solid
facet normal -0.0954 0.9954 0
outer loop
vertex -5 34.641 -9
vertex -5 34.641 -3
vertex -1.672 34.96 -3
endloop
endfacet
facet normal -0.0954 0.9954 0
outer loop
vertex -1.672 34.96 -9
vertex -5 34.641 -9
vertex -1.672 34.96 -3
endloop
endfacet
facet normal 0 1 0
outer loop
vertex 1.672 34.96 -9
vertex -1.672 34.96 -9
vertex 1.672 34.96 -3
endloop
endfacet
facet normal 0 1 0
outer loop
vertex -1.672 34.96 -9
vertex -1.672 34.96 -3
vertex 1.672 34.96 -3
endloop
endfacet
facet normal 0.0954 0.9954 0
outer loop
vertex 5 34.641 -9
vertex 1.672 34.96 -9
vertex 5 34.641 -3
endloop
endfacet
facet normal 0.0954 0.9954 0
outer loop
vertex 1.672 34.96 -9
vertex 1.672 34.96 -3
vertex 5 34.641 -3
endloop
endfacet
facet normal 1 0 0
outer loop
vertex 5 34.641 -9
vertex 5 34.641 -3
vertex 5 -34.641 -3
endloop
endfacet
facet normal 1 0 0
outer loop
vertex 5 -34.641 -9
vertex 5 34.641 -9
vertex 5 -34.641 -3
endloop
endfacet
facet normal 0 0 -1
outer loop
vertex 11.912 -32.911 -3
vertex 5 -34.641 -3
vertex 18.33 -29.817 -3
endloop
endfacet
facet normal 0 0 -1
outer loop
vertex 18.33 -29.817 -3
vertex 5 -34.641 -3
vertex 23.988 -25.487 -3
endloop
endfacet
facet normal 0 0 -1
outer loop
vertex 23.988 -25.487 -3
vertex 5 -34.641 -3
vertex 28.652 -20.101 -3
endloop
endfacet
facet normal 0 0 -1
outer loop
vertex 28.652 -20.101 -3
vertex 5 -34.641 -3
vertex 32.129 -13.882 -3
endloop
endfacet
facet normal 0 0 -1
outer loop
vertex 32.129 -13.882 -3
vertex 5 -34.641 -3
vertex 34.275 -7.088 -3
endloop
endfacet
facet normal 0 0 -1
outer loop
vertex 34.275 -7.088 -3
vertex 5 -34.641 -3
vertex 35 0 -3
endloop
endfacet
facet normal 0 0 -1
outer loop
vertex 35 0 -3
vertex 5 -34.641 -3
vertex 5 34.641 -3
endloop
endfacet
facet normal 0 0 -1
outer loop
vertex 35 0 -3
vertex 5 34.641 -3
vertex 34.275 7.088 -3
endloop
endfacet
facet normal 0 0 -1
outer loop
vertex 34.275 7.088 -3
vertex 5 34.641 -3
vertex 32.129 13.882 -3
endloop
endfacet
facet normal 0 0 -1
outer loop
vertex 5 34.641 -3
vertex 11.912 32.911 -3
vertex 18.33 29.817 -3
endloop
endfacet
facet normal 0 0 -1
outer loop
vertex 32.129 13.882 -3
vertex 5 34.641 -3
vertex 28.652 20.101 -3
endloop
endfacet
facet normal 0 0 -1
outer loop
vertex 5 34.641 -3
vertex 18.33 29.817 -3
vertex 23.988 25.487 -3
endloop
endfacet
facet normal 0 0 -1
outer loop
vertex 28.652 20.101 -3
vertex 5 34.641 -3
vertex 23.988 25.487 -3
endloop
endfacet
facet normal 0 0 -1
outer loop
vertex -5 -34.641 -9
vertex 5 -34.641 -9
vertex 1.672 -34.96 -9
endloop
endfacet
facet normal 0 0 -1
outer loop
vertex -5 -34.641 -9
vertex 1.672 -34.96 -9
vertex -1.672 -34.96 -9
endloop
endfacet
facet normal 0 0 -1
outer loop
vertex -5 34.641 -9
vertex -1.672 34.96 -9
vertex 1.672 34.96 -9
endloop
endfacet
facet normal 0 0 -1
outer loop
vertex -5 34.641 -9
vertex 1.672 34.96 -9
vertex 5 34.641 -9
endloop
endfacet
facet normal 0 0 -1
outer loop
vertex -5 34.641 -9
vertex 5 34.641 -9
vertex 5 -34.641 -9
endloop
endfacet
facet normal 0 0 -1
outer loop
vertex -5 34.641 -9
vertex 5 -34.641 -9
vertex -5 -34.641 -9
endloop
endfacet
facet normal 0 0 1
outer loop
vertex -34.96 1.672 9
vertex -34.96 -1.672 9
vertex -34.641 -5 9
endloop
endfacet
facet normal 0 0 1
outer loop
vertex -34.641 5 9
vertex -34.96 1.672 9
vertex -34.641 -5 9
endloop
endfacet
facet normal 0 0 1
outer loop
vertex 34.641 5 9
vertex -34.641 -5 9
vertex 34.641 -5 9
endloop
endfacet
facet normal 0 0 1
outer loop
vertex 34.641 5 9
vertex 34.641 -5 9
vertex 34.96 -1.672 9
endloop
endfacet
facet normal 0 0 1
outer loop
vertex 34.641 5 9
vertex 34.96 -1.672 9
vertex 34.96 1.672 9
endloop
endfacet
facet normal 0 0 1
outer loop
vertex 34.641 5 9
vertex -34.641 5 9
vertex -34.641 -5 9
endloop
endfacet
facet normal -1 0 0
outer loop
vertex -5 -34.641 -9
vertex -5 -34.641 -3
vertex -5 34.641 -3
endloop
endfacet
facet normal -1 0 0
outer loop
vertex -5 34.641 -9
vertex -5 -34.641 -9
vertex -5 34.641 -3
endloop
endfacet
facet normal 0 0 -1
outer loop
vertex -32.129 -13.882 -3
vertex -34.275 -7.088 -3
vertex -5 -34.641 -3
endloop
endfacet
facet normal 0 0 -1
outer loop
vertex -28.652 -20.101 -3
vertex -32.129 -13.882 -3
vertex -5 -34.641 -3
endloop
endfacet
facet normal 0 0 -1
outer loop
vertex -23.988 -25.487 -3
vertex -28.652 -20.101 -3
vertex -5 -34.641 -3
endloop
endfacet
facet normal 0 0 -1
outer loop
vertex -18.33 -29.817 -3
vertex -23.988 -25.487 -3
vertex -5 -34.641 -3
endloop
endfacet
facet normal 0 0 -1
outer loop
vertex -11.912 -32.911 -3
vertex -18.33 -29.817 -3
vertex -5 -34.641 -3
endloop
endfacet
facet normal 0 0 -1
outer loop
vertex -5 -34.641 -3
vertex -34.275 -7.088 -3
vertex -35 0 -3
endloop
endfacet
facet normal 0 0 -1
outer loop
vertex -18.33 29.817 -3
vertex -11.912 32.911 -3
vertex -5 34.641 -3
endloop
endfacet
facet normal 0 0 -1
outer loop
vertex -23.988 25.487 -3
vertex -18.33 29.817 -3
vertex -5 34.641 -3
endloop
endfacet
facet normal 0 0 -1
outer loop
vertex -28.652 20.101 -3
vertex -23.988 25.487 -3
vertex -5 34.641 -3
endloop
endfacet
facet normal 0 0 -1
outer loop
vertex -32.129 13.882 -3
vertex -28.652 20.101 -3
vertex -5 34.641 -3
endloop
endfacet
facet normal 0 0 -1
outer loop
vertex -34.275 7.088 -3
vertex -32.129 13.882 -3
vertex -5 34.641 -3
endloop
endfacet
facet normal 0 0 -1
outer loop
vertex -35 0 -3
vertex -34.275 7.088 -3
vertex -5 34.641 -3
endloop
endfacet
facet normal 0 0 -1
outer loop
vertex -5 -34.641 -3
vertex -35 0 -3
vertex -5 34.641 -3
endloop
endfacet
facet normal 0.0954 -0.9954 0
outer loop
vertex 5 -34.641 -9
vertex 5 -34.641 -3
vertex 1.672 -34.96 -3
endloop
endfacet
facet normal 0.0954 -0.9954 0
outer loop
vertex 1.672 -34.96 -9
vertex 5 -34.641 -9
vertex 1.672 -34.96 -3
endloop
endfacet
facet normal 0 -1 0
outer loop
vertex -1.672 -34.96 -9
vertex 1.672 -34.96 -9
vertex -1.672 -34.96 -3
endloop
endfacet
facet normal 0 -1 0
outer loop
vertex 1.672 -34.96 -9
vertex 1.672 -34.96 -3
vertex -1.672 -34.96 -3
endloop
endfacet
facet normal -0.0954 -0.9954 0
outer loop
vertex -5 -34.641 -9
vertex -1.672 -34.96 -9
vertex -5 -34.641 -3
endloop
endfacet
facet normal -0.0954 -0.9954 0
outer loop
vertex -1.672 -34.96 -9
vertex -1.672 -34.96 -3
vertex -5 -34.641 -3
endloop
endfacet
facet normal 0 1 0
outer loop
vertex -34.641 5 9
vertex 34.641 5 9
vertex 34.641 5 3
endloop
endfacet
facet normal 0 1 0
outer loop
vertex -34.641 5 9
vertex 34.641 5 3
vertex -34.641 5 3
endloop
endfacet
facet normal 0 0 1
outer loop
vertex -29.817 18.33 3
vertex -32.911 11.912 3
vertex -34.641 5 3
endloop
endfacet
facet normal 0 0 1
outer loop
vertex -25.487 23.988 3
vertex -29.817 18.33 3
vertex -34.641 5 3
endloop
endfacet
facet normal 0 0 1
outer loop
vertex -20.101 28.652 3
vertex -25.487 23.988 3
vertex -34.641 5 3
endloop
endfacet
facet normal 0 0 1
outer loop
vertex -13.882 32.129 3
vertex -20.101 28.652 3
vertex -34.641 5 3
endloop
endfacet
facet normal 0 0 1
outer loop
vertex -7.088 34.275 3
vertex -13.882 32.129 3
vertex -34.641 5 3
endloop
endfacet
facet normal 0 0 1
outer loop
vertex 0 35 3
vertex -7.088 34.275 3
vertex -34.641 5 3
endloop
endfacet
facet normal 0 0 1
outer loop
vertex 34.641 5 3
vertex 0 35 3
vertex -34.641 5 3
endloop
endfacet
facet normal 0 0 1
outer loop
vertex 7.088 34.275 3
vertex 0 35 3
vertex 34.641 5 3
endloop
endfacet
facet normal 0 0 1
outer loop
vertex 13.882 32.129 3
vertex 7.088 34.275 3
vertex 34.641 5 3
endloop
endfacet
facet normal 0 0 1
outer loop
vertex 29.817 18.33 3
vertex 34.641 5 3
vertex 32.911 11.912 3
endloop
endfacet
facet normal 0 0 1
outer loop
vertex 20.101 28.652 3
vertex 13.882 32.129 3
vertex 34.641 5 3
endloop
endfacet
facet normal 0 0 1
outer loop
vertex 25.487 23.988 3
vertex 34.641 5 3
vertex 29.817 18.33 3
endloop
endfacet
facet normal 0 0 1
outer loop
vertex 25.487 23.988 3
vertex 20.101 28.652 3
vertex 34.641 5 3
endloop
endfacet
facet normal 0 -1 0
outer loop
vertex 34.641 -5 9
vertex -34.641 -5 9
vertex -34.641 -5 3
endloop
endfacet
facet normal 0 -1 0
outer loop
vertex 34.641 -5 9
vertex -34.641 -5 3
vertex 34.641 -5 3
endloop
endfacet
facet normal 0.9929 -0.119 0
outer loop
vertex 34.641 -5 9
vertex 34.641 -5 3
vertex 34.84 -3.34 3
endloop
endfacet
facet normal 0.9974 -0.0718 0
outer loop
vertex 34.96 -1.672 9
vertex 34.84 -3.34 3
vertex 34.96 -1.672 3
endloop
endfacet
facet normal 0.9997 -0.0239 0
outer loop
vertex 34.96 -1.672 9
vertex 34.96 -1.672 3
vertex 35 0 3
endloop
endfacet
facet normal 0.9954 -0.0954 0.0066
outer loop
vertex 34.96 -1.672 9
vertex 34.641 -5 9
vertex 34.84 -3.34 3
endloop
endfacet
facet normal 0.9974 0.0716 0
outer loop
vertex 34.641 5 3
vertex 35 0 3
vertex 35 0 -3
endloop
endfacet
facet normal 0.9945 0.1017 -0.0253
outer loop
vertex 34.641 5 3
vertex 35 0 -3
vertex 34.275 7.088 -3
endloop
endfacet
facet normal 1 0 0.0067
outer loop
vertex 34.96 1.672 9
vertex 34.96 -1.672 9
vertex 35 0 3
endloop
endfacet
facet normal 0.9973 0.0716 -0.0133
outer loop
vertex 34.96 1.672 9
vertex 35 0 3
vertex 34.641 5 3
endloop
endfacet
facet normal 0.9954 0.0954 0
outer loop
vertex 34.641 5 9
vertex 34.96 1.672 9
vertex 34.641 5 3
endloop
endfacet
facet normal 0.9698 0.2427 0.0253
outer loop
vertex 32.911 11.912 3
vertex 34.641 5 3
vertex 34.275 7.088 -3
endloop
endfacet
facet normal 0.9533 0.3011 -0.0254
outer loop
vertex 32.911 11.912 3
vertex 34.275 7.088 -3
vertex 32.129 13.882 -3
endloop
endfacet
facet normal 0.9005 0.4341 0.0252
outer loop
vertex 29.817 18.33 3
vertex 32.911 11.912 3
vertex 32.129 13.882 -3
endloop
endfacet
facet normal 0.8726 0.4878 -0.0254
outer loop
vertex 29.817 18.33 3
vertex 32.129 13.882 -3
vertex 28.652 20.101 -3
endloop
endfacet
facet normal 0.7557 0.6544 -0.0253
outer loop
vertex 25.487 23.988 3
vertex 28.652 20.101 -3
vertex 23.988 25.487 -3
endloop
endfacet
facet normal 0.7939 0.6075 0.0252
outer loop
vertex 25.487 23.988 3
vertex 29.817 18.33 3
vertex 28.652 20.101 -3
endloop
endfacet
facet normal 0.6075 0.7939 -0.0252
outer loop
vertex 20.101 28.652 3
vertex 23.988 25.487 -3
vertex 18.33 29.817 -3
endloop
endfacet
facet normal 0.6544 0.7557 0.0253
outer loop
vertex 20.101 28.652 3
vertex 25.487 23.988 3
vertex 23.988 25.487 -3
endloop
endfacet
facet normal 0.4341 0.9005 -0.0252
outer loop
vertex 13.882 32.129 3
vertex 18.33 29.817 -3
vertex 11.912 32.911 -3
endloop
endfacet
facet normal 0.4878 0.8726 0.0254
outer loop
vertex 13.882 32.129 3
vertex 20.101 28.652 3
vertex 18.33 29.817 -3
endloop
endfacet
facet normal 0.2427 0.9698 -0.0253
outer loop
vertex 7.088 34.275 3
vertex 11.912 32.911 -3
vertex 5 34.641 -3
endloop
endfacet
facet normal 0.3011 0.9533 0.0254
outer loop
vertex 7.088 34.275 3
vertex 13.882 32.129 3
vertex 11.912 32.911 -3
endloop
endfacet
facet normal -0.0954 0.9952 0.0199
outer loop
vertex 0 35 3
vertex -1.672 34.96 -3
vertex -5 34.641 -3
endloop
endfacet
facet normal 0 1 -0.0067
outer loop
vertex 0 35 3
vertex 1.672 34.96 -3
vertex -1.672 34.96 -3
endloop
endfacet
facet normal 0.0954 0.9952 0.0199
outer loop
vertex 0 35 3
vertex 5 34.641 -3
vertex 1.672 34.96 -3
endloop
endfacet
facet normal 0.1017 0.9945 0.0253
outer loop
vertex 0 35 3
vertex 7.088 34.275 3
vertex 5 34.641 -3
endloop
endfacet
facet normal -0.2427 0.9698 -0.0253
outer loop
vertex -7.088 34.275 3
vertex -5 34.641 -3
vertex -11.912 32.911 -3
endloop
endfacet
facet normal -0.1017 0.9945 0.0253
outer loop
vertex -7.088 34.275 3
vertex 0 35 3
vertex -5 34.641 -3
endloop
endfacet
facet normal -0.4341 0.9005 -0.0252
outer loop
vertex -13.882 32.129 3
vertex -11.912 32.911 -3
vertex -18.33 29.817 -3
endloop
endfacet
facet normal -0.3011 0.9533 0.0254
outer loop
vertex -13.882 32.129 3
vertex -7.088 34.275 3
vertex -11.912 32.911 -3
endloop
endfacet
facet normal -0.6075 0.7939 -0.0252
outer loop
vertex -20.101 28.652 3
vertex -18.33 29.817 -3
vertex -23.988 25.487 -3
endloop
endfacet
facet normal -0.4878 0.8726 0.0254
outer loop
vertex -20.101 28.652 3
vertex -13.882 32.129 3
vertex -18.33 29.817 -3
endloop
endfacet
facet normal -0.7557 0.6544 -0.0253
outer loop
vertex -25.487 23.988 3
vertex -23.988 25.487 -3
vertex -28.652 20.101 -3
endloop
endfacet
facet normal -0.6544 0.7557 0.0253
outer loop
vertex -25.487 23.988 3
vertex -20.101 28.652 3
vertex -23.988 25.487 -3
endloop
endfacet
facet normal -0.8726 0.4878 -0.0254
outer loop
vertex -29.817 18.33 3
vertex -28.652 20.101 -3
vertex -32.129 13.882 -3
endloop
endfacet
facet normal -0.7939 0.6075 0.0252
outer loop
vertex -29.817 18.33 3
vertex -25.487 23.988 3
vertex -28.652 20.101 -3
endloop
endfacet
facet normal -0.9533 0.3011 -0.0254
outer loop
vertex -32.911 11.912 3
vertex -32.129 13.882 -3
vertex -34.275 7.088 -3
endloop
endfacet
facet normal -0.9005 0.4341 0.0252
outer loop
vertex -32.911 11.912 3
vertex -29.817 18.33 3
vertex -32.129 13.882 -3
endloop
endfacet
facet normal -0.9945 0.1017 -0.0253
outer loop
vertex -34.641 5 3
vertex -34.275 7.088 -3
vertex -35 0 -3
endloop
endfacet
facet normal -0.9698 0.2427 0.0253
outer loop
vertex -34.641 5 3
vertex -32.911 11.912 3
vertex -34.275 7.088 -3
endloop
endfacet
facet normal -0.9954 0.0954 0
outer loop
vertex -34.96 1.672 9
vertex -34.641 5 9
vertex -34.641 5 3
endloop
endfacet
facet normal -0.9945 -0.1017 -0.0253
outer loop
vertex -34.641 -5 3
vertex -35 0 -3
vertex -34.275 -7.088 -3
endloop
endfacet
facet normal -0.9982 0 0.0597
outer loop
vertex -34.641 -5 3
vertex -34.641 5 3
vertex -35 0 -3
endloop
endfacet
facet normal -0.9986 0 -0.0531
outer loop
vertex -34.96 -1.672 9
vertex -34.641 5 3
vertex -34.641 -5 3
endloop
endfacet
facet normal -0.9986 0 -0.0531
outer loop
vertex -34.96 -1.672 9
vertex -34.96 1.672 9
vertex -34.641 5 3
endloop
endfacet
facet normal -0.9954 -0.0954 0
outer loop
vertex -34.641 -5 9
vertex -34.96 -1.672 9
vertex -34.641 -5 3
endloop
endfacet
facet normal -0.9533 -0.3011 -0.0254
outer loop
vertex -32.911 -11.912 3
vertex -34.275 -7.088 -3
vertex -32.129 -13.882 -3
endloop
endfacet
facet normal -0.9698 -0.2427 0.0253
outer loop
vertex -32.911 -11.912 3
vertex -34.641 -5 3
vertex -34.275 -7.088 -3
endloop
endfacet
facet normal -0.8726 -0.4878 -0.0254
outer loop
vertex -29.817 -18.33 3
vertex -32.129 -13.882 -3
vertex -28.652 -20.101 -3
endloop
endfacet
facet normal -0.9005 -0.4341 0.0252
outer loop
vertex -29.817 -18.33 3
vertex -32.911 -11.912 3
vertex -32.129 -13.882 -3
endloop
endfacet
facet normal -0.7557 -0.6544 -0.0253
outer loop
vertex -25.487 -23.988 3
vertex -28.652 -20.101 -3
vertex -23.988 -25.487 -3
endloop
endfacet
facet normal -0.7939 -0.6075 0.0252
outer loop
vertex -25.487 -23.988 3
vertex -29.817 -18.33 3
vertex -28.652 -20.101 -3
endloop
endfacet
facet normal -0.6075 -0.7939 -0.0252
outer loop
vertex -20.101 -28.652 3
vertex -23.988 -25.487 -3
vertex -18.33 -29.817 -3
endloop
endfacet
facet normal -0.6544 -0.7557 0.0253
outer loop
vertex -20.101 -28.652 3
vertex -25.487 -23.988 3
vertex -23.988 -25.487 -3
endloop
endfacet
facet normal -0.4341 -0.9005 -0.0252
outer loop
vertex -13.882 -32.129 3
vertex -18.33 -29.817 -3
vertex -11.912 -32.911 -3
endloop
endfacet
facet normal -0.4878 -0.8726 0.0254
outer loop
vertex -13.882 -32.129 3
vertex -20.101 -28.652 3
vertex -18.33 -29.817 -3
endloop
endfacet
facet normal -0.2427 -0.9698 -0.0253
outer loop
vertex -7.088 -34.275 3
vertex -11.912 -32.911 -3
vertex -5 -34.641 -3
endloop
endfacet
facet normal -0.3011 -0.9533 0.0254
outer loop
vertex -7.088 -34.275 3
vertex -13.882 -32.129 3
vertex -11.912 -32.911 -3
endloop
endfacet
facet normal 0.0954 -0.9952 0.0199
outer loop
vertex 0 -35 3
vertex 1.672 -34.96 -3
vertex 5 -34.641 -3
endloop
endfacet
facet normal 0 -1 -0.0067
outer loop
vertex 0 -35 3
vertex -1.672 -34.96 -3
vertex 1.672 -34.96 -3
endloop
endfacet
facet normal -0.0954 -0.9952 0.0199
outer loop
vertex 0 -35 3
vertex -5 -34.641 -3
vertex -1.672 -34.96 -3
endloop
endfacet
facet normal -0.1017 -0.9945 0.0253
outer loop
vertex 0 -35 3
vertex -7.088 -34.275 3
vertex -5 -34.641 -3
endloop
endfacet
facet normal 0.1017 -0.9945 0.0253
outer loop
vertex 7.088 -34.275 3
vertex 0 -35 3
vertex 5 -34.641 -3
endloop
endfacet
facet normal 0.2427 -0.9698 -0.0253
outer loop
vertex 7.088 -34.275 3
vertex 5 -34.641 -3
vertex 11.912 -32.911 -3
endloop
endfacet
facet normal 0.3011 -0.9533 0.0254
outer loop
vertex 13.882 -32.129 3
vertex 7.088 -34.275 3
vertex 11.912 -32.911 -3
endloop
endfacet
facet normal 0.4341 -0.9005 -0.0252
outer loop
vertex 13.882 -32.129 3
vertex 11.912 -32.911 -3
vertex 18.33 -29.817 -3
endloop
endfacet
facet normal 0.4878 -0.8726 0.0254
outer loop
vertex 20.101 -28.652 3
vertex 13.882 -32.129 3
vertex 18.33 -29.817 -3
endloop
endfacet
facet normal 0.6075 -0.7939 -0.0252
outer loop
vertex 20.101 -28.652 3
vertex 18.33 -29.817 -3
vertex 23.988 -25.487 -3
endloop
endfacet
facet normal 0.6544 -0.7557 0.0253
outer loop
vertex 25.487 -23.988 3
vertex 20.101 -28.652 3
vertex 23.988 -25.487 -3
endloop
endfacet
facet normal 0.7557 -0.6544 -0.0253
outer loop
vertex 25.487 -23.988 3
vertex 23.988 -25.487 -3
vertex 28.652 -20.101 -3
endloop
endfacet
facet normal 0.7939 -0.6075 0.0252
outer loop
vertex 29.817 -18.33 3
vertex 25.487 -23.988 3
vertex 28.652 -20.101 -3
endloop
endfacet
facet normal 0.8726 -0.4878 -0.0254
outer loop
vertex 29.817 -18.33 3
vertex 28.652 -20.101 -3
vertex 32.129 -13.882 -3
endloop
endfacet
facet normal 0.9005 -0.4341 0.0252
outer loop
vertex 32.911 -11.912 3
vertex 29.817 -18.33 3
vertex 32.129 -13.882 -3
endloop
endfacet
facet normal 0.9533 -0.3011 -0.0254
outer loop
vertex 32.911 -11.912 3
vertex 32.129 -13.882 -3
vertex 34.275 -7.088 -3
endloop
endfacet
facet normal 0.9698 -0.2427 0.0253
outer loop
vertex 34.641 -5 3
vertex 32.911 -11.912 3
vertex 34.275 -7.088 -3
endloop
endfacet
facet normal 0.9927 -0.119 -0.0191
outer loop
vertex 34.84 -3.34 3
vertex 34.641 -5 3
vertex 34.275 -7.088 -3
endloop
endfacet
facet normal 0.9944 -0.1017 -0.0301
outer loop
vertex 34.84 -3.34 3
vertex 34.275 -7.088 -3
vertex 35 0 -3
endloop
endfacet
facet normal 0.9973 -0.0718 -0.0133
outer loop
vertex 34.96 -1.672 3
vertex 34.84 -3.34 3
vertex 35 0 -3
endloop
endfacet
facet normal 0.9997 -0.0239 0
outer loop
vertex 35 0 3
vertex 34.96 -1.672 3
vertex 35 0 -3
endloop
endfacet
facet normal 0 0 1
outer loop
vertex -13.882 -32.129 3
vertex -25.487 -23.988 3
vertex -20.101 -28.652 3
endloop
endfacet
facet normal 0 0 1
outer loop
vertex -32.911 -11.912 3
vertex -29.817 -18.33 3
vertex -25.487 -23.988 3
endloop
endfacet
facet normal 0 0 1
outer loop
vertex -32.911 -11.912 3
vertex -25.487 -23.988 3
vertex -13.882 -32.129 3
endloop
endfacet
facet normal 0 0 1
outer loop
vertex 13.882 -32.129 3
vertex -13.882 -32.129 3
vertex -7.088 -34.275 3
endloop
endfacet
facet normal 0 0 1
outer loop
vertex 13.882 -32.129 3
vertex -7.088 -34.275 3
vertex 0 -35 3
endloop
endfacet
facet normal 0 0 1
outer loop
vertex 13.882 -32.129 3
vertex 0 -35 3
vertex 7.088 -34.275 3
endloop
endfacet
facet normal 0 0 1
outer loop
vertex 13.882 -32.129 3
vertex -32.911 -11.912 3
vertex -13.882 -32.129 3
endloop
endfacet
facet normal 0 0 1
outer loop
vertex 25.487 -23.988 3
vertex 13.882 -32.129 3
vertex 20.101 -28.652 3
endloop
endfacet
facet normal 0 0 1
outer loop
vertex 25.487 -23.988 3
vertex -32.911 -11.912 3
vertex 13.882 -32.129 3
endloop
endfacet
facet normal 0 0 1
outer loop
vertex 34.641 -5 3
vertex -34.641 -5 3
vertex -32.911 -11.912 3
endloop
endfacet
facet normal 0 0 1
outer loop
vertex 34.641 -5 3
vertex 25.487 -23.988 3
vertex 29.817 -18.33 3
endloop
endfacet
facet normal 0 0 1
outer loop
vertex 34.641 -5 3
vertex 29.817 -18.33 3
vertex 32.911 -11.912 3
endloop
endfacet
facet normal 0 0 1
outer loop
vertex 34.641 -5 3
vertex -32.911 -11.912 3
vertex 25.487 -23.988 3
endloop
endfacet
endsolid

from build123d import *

# Parameters (mm, degrees)
SKETCH1_R           = 35
BOSS_EXTRUDE1_DEPTH = 3
BOSS_EXTRUDE2_START = 6
BOSS_EXTRUDE2_DEPTH = 6
BOSS_EXTRUDE3_DEPTH = 6


with BuildPart() as part:
    # Sketch1 → Boss-Extrude1 (new, symmetric)
    with BuildSketch(Plane.XY):
        Circle(SKETCH1_R)
    extrude(amount=BOSS_EXTRUDE1_DEPTH, both=True)

    # Sketch2 → Boss-Extrude2 (add)
    with BuildSketch(Plane.XY.offset(3).offset(BOSS_EXTRUDE2_START)):
        with BuildLine():
            Line((34.641016151, 5), (-34.641016151, 5))
            ThreePointArc((-34.641016151, 5), (-35, 0), (-34.641016151, -5))
            Line((-34.641016151, -5), (34.641016151, -5))
            ThreePointArc((34.641016151, -5), (35, 0), (34.641016151, 5))
        make_face()
    extrude(amount=-BOSS_EXTRUDE2_DEPTH)

    # Sketch3 → Boss-Extrude3 (add)
    with BuildSketch(Plane(origin=(0, 0, -3), x_dir=(-1, 0, 0), z_dir=(0, 0, -1))):
        with BuildLine():
            Line((5, -34.641016151), (5, 34.641016151))
            ThreePointArc((5, 34.641016151), (0, 35), (-5, 34.641016151))
            Line((-5, 34.641016151), (-5, -34.641016151))
            ThreePointArc((-5, -34.641016151), (0, -35), (5, -34.641016151))
        make_face()
    extrude(amount=BOSS_EXTRUDE3_DEPTH)


solid = part.part
